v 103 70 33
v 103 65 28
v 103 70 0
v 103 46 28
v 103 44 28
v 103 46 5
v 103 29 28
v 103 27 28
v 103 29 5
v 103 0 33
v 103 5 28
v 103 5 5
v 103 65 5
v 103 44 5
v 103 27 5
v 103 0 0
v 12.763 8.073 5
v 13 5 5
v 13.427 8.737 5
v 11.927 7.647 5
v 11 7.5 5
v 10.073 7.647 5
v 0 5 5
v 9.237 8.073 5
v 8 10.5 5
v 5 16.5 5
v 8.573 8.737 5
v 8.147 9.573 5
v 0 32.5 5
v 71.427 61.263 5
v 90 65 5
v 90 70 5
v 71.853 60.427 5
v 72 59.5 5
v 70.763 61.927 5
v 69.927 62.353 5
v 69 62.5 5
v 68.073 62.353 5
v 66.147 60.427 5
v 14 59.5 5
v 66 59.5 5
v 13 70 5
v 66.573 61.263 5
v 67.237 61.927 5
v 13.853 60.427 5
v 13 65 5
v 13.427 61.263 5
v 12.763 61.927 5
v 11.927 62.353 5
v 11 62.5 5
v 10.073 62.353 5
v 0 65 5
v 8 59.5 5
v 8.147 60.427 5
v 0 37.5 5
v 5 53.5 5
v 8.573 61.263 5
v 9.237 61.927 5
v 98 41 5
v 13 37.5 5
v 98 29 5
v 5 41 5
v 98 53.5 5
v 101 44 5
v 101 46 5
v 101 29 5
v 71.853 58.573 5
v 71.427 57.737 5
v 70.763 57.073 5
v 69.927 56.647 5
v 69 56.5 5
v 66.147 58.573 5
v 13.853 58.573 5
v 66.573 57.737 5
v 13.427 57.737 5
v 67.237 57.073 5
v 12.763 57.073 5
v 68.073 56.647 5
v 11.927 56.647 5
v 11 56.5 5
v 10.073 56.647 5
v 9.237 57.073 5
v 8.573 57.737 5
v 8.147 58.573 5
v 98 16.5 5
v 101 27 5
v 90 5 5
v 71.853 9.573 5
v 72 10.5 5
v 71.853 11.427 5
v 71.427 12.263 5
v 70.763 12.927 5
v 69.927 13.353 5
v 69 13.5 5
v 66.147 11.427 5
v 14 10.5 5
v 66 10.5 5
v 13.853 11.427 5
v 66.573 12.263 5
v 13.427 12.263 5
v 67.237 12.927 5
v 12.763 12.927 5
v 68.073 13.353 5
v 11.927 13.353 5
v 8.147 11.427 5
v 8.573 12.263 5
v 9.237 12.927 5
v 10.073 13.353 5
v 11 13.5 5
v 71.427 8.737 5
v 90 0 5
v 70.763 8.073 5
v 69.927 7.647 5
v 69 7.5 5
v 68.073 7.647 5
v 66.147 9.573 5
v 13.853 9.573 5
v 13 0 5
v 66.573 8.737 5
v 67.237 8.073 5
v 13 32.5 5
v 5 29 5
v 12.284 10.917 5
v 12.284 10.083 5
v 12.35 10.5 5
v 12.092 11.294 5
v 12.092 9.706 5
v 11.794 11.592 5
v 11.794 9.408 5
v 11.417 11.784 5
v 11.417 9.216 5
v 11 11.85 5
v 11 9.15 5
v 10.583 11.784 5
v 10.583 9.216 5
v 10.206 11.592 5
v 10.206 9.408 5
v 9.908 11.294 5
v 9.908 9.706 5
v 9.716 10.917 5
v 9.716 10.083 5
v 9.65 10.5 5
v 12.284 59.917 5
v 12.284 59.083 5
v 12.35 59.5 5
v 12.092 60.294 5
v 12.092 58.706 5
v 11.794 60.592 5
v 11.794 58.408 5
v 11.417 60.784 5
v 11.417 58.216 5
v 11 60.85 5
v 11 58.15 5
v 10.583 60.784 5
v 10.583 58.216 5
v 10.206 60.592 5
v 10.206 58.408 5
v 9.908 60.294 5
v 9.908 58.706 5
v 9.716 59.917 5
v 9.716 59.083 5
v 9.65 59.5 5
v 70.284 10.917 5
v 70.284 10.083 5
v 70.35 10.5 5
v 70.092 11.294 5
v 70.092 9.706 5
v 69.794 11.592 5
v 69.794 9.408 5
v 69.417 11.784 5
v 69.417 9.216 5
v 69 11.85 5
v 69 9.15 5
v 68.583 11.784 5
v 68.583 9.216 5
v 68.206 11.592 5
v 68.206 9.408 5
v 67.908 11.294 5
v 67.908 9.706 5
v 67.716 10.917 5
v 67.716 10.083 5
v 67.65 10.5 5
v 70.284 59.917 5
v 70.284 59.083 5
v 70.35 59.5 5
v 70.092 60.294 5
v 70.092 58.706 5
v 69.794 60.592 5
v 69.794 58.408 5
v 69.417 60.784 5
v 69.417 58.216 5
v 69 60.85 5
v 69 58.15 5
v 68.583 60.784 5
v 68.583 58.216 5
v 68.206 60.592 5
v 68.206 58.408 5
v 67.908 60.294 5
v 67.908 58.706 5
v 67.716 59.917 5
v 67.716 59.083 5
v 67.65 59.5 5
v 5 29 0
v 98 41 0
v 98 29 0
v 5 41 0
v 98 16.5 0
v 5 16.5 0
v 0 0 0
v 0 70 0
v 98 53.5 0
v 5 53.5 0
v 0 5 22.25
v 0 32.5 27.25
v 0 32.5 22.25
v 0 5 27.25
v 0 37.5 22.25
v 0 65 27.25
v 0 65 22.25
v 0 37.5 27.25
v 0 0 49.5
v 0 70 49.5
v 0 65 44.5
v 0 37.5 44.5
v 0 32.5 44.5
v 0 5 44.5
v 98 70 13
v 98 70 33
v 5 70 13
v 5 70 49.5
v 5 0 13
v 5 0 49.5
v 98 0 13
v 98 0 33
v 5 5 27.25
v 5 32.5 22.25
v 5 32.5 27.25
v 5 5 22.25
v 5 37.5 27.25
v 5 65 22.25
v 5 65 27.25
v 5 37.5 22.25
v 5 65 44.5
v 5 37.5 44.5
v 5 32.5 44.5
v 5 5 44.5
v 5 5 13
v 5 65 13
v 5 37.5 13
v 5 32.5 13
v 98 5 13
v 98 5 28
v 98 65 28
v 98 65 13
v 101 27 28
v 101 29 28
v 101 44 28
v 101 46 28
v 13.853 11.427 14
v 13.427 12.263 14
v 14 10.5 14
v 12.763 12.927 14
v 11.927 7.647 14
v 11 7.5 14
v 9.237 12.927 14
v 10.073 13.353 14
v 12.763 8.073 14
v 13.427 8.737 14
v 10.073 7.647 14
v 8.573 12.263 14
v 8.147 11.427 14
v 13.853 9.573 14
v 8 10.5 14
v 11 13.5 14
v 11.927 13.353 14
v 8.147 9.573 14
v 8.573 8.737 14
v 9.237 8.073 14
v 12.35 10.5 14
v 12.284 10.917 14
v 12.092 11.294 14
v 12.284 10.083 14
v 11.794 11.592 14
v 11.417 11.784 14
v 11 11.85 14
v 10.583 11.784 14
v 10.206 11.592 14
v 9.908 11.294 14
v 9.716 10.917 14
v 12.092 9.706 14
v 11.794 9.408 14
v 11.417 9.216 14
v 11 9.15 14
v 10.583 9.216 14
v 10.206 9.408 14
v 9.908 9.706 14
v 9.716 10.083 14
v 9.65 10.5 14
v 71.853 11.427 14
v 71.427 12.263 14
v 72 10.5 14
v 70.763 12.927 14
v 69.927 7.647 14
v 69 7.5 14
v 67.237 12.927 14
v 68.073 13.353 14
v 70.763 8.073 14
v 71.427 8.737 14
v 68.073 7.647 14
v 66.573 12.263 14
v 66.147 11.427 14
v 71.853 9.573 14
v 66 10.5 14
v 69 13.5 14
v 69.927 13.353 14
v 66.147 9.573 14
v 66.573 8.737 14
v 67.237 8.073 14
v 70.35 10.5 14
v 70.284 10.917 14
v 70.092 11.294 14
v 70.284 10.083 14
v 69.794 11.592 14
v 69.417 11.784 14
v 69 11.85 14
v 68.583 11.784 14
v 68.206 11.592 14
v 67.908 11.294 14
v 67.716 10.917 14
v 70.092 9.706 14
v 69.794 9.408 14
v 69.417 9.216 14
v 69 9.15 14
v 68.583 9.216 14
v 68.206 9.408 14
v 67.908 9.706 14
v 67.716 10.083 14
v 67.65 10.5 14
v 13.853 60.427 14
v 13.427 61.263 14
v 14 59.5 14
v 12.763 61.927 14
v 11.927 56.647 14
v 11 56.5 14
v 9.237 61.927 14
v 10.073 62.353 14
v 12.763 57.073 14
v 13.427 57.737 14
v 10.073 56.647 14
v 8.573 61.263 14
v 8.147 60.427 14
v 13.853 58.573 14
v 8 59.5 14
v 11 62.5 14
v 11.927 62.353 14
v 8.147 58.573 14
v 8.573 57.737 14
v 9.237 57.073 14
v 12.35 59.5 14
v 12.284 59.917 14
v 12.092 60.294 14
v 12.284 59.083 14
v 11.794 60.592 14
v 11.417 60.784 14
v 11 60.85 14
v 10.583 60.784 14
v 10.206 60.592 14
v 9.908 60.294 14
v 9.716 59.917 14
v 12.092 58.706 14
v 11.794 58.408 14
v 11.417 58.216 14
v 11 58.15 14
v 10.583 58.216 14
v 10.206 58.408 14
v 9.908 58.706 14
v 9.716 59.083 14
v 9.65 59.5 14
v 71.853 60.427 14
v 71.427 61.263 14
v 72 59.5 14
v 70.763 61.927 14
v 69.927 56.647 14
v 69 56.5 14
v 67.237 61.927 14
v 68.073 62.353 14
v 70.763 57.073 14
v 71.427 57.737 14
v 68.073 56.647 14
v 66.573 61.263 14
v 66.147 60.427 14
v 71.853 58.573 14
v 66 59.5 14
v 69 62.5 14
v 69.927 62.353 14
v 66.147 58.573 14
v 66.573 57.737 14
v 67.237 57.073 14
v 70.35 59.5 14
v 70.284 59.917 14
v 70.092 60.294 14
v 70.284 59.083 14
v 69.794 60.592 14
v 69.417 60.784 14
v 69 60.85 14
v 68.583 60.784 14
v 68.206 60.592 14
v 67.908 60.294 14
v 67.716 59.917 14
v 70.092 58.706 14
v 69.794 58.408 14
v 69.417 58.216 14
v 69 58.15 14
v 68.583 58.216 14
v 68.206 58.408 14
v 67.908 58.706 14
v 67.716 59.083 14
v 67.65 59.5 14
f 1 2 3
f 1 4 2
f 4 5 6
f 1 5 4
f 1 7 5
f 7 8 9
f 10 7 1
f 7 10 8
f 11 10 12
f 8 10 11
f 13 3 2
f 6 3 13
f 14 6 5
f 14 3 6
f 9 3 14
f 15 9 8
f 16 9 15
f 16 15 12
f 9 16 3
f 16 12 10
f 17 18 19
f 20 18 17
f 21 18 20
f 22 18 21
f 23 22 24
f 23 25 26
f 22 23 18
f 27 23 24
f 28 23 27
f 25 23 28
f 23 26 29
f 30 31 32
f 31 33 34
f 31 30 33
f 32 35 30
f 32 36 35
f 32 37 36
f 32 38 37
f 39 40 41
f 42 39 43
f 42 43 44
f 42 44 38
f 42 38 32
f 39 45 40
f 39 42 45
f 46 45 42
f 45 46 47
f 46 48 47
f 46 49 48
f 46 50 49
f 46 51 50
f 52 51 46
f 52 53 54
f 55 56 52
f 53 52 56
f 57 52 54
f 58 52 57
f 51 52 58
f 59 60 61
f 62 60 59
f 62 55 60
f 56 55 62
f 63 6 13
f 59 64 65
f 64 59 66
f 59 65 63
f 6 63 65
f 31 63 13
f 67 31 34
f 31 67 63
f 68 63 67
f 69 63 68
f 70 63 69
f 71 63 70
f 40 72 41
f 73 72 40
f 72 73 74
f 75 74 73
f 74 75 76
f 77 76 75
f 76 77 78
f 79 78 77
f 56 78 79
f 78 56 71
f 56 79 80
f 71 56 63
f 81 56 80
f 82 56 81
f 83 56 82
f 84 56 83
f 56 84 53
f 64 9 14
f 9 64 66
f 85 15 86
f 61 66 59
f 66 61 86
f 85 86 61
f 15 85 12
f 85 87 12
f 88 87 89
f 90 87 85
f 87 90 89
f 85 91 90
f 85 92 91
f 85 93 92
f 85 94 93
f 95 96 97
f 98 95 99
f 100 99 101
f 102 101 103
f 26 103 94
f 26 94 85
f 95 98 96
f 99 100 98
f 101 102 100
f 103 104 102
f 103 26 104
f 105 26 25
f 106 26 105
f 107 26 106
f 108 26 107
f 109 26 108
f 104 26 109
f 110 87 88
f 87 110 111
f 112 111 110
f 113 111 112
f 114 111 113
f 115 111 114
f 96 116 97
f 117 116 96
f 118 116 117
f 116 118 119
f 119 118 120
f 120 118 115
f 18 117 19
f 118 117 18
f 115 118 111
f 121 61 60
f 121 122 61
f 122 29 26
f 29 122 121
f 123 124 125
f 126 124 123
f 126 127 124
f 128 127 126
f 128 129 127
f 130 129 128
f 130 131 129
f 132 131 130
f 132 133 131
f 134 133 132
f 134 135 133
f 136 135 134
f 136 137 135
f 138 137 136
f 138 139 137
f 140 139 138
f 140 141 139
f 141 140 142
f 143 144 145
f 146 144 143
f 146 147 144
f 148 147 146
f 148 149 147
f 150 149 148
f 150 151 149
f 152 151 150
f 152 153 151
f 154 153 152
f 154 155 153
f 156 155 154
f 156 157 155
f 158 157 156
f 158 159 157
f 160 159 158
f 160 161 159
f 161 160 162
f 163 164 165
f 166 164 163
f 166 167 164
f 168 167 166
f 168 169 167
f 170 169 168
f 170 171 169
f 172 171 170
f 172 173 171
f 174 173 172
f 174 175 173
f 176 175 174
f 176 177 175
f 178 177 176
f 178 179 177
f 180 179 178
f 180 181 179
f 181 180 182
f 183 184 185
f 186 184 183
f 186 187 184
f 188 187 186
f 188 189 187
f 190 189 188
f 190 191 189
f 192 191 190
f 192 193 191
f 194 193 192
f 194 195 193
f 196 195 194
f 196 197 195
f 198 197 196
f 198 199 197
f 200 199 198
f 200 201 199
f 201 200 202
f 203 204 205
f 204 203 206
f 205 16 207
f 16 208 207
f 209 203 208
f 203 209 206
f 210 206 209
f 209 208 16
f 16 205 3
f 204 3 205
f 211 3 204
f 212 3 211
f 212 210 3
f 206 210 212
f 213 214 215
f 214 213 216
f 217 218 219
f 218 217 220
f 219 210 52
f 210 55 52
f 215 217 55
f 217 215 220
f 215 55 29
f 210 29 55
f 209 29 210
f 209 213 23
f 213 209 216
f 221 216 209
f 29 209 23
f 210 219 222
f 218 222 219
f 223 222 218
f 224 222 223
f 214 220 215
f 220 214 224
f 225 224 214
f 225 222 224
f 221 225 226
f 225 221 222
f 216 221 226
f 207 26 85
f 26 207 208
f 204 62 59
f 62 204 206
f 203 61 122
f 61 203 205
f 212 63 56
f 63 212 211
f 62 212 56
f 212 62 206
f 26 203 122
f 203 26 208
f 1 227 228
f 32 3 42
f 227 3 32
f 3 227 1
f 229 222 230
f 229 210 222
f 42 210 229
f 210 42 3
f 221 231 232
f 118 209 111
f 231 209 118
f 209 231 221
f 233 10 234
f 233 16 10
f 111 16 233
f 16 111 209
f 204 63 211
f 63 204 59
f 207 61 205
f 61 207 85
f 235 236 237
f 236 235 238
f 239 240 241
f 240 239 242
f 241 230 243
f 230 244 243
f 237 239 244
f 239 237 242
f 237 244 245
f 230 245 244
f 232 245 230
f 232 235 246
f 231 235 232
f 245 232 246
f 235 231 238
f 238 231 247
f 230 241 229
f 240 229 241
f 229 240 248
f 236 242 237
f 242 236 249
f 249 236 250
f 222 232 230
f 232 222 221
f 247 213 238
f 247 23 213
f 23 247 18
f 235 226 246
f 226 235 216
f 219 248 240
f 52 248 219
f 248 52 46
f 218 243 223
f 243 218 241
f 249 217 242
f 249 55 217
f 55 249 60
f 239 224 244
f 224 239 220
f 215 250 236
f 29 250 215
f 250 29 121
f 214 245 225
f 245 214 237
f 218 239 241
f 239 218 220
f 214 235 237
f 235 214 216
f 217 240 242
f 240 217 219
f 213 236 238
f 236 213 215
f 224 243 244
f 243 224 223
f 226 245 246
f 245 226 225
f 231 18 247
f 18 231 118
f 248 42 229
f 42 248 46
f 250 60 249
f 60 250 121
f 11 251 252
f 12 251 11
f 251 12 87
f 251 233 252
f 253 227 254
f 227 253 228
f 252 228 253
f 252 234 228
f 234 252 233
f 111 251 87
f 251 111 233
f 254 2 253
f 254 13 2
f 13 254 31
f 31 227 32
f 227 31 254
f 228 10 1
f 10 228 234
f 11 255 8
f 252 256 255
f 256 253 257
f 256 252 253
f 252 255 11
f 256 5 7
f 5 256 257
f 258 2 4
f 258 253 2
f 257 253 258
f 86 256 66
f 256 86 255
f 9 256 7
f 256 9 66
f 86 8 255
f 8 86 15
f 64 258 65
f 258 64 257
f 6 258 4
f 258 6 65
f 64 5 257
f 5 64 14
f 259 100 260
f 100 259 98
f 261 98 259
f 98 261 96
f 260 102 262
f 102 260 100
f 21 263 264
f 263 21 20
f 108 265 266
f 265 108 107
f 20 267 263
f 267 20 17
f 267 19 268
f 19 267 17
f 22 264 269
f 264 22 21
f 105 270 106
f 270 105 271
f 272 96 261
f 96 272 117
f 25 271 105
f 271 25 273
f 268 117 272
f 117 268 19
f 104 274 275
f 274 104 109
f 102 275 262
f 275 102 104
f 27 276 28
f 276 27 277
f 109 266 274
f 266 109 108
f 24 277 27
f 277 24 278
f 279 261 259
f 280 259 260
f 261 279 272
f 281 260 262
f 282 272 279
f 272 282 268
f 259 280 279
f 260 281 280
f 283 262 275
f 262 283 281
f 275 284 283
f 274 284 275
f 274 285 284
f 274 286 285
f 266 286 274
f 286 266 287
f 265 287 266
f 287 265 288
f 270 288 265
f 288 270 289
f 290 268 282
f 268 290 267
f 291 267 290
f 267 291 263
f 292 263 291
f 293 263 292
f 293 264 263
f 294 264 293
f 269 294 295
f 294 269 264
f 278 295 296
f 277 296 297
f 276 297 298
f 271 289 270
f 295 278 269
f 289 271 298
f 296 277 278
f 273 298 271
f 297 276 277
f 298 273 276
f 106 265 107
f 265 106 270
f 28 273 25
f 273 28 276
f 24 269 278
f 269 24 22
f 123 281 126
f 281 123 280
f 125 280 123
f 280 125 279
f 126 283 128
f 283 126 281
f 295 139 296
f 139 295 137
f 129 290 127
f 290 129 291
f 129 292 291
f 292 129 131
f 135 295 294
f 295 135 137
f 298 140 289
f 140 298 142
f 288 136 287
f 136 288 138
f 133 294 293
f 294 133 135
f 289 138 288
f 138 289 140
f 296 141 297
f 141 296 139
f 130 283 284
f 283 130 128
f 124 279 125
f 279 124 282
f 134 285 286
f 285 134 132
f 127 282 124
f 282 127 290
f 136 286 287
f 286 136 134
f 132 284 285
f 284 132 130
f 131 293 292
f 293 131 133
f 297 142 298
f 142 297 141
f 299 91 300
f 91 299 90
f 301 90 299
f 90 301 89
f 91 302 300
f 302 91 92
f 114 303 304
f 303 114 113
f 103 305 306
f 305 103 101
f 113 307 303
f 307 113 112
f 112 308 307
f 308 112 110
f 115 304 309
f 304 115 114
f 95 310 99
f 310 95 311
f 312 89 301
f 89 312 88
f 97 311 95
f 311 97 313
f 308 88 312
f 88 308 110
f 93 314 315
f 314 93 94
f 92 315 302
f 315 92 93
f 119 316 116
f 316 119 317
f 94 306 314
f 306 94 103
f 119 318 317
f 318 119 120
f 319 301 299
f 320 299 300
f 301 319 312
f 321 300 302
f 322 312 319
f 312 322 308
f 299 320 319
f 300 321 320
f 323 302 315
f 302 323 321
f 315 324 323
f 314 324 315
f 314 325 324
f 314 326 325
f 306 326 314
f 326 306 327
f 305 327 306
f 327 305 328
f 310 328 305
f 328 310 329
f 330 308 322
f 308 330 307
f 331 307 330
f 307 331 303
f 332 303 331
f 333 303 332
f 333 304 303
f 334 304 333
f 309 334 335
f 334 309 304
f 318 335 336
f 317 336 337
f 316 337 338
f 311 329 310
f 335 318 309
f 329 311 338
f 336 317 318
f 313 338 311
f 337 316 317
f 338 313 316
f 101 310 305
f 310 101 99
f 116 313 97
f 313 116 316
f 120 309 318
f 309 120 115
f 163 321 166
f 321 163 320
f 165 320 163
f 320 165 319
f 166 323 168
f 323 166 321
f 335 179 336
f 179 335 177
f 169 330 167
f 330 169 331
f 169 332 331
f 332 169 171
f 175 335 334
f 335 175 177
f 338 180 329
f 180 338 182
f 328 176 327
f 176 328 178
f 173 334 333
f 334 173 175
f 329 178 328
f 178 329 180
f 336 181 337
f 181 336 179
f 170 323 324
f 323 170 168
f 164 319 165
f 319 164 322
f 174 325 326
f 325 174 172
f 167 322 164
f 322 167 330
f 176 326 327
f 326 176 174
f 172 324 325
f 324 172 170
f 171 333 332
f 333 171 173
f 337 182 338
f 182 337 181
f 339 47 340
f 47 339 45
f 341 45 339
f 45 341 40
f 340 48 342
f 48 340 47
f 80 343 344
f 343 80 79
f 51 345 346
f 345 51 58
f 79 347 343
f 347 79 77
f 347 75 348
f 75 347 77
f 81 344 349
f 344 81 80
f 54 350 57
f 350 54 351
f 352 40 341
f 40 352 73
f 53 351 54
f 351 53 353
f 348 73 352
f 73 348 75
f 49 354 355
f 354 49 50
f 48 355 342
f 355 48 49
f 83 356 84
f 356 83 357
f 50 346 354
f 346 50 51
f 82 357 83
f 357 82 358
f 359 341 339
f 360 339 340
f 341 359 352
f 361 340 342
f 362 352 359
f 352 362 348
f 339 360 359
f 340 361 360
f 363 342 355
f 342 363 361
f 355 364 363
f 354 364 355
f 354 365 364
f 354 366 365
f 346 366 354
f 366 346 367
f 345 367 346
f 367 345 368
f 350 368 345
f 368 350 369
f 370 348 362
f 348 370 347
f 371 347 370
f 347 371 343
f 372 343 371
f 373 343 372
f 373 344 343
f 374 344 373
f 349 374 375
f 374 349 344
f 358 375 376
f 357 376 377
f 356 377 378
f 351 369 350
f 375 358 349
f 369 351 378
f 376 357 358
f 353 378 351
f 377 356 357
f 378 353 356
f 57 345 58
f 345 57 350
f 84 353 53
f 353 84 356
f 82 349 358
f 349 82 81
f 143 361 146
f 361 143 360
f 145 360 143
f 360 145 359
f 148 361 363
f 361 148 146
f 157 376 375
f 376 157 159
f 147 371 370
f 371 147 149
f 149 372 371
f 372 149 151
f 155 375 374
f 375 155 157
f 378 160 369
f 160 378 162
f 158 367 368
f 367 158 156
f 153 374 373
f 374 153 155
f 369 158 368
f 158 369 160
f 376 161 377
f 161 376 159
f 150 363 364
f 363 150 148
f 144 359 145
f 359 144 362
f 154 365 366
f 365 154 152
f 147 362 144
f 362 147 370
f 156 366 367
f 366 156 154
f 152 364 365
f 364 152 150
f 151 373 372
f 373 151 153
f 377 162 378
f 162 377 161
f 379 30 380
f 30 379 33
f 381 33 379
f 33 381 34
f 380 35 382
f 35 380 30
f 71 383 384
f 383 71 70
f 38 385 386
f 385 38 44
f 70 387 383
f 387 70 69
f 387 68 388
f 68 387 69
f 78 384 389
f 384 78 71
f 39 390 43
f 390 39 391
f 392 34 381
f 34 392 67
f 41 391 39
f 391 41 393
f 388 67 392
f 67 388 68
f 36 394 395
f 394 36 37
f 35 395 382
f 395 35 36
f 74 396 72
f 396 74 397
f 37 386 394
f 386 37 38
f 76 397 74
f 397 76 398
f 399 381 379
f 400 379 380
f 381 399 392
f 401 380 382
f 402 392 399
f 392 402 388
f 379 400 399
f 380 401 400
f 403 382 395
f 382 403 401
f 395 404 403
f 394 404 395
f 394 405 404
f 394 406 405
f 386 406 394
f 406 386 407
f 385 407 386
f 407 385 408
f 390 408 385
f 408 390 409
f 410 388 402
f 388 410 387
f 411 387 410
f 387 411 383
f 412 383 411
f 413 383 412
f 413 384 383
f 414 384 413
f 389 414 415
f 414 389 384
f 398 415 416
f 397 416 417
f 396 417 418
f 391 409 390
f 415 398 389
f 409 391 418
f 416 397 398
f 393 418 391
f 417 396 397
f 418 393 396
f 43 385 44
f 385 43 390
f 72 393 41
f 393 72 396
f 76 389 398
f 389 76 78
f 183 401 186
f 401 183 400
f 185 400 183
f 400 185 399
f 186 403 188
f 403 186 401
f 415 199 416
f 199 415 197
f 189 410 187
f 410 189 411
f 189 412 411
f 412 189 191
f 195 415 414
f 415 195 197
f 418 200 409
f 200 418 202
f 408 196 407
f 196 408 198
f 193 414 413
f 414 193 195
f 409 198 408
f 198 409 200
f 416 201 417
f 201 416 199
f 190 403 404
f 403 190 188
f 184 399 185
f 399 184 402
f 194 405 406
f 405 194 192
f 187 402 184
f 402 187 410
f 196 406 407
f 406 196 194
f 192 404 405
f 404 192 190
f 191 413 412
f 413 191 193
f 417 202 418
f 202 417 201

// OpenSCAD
// Neato XV Signature Pro - Right Pod
// Mounts: Pi 5 + AI HAT+ 2 (pre-stacked)
// Location: right side of rear chassis (viewed from behind robot)
// One-piece print — flat on bed, no supports needed.
//
// ORIENTATION (as mounted on robot):
//   Bottom face = velcros to robot chassis
//   Pi long axis runs across chassis (X)
//   USB/ethernet ports face inward (toward center vent) = high X side
//   Non-USB edge faces outer (left) wall = low X side
//
// Outer (left) wall: 75% height, mid + top horizontal beams
// Inner (right/USB) wall: 50% height, stops at mid beam — port access

// ============================================================
// PARAMETERS
// ============================================================

pod_width  = 103;
pod_depth  = 70;
pod_height = 66;

rail_w = 5;
rib_w  = 12;

outer_wall_h = pod_height * 0.75;  // ~50mm
inner_wall_h = pod_height * 0.50;  // ~33mm — stops at mid beam

standoff_h    = 9;
standoff_od   = 6;
standoff_hole = 2.7; // M2.5

pi_hole_x_span = 58;
pi_hole_y_span = 49;

pi_x_left  = 11;
pi_x_right = pi_x_left + pi_hole_x_span;  // 69mm

pi_y_front = (pod_depth - pi_hole_y_span) / 2;  // 10.5mm
pi_y_rear  = pi_y_front + pi_hole_y_span;        // 59.5mm
pi_y_mid   = (pi_y_front + pi_y_rear) / 2;       // 35mm

rib_positions = [pi_y_front, pi_y_mid, pi_y_rear];

pi_holes = [
    [pi_x_left,  pi_y_front],
    [pi_x_right, pi_y_front],
    [pi_x_left,  pi_y_rear ],
    [pi_x_right, pi_y_rear ],
];

// Port-aware inner rail gap positions (measured from ruler)
port_post_nic_usb3  = 28;
port_post_usb3_usb2 = 45;
thin_post = 2;

// ============================================================
// MODULES
// ============================================================

module ribbed_bottom() {
    cube([rail_w, pod_depth, rail_w]);
    translate([pod_width - rail_w, 0, 0])
        cube([rail_w, pod_depth, rail_w]);
    cube([pod_width, rail_w, rail_w]);
    translate([0, pod_depth - rail_w, 0])
        cube([pod_width, rail_w, rail_w]);
    for (y_center = rib_positions) {
        translate([0, y_center - rib_w / 2, 0])
            cube([pod_width, rib_w, rail_w]);
    }
}

// Gusset: triangle in XZ plane, 3mm thick in Y
// X=0 at post inner face, Z=0 at base top, extends +X into pod and +Z up post
module gusset() {
    rotate([90, 0, 0])
        translate([0, 0, -5])
            linear_extrude(height=5)
                polygon([[0,0], [8,0], [0,8]]);
}

module outer_wall() {
    // Back post
    cube([rail_w, rail_w, outer_wall_h]);
    // Front post
    translate([0, pod_depth - rail_w, 0])
        cube([rail_w, rail_w, outer_wall_h]);
    // Center post
    translate([0, pod_depth/2 - rail_w/2, 0])
        cube([rail_w, rail_w, outer_wall_h]);
    // Mid horizontal
    translate([0, 0, outer_wall_h/2 - rail_w/2])
        cube([rail_w, pod_depth, rail_w]);
    // Top horizontal
    translate([0, 0, outer_wall_h - rail_w])
        cube([rail_w, pod_depth, rail_w]);
    // Gussets — back and front corner posts only
    // Back post: Y=1 to Y=4 (centered on 5mm post), extends into pod in X
    translate([rail_w, 0, rail_w])
        gusset();
    translate([rail_w, pod_depth, rail_w])
        mirror([0, 1, 0]) gusset();
    // Center post
    translate([rail_w, pod_depth/2 - rail_w/2, rail_w])
        gusset();
}

module inner_wall() {
    // Back corner post (NIC side)
    cube([rail_w, rail_w, inner_wall_h]);
    // Gussets — back and front corner posts, extending toward outer wall (-X)
    translate([pod_width - rail_w, 0, rail_w])
        mirror([1, 0, 0]) gusset();
    translate([pod_width - rail_w, pod_depth, rail_w])
        mirror([1, 0, 0]) mirror([0, 1, 0]) gusset();
    // Front corner post (USB side)
    translate([pod_width - rail_w, pod_depth - rail_w, 0])
        cube([rail_w, rail_w, inner_wall_h]);
    // Thin inter-port posts up to mid beam
    translate([pod_width - thin_post, port_post_nic_usb3 - thin_post/2, 0])
        cube([thin_post, thin_post, inner_wall_h - rail_w]);
    translate([pod_width - thin_post, port_post_usb3_usb2 - thin_post/2, 0])
        cube([thin_post, thin_post, inner_wall_h - rail_w]);
    // Back corner post
    translate([pod_width - rail_w, 0, 0])
        cube([rail_w, rail_w, inner_wall_h]);
    // Mid/top horizontal beam (single beam at top of inner wall)
    translate([pod_width - rail_w, 0, inner_wall_h - rail_w])
        cube([rail_w, pod_depth, rail_w]);
}

module standoff(h, hole_d) {
    difference() {
        cylinder(h=h, d=standoff_od, $fn=20);
        cylinder(h=h + 0.1, d=hole_d, $fn=20);
    }
}

// ============================================================
// MAIN
// ============================================================

union() {
    ribbed_bottom();
    outer_wall();
    inner_wall();

    for (h = pi_holes) {
        translate([h[0], h[1], rail_w])
            standoff(standoff_h, standoff_hole);
    }
}
